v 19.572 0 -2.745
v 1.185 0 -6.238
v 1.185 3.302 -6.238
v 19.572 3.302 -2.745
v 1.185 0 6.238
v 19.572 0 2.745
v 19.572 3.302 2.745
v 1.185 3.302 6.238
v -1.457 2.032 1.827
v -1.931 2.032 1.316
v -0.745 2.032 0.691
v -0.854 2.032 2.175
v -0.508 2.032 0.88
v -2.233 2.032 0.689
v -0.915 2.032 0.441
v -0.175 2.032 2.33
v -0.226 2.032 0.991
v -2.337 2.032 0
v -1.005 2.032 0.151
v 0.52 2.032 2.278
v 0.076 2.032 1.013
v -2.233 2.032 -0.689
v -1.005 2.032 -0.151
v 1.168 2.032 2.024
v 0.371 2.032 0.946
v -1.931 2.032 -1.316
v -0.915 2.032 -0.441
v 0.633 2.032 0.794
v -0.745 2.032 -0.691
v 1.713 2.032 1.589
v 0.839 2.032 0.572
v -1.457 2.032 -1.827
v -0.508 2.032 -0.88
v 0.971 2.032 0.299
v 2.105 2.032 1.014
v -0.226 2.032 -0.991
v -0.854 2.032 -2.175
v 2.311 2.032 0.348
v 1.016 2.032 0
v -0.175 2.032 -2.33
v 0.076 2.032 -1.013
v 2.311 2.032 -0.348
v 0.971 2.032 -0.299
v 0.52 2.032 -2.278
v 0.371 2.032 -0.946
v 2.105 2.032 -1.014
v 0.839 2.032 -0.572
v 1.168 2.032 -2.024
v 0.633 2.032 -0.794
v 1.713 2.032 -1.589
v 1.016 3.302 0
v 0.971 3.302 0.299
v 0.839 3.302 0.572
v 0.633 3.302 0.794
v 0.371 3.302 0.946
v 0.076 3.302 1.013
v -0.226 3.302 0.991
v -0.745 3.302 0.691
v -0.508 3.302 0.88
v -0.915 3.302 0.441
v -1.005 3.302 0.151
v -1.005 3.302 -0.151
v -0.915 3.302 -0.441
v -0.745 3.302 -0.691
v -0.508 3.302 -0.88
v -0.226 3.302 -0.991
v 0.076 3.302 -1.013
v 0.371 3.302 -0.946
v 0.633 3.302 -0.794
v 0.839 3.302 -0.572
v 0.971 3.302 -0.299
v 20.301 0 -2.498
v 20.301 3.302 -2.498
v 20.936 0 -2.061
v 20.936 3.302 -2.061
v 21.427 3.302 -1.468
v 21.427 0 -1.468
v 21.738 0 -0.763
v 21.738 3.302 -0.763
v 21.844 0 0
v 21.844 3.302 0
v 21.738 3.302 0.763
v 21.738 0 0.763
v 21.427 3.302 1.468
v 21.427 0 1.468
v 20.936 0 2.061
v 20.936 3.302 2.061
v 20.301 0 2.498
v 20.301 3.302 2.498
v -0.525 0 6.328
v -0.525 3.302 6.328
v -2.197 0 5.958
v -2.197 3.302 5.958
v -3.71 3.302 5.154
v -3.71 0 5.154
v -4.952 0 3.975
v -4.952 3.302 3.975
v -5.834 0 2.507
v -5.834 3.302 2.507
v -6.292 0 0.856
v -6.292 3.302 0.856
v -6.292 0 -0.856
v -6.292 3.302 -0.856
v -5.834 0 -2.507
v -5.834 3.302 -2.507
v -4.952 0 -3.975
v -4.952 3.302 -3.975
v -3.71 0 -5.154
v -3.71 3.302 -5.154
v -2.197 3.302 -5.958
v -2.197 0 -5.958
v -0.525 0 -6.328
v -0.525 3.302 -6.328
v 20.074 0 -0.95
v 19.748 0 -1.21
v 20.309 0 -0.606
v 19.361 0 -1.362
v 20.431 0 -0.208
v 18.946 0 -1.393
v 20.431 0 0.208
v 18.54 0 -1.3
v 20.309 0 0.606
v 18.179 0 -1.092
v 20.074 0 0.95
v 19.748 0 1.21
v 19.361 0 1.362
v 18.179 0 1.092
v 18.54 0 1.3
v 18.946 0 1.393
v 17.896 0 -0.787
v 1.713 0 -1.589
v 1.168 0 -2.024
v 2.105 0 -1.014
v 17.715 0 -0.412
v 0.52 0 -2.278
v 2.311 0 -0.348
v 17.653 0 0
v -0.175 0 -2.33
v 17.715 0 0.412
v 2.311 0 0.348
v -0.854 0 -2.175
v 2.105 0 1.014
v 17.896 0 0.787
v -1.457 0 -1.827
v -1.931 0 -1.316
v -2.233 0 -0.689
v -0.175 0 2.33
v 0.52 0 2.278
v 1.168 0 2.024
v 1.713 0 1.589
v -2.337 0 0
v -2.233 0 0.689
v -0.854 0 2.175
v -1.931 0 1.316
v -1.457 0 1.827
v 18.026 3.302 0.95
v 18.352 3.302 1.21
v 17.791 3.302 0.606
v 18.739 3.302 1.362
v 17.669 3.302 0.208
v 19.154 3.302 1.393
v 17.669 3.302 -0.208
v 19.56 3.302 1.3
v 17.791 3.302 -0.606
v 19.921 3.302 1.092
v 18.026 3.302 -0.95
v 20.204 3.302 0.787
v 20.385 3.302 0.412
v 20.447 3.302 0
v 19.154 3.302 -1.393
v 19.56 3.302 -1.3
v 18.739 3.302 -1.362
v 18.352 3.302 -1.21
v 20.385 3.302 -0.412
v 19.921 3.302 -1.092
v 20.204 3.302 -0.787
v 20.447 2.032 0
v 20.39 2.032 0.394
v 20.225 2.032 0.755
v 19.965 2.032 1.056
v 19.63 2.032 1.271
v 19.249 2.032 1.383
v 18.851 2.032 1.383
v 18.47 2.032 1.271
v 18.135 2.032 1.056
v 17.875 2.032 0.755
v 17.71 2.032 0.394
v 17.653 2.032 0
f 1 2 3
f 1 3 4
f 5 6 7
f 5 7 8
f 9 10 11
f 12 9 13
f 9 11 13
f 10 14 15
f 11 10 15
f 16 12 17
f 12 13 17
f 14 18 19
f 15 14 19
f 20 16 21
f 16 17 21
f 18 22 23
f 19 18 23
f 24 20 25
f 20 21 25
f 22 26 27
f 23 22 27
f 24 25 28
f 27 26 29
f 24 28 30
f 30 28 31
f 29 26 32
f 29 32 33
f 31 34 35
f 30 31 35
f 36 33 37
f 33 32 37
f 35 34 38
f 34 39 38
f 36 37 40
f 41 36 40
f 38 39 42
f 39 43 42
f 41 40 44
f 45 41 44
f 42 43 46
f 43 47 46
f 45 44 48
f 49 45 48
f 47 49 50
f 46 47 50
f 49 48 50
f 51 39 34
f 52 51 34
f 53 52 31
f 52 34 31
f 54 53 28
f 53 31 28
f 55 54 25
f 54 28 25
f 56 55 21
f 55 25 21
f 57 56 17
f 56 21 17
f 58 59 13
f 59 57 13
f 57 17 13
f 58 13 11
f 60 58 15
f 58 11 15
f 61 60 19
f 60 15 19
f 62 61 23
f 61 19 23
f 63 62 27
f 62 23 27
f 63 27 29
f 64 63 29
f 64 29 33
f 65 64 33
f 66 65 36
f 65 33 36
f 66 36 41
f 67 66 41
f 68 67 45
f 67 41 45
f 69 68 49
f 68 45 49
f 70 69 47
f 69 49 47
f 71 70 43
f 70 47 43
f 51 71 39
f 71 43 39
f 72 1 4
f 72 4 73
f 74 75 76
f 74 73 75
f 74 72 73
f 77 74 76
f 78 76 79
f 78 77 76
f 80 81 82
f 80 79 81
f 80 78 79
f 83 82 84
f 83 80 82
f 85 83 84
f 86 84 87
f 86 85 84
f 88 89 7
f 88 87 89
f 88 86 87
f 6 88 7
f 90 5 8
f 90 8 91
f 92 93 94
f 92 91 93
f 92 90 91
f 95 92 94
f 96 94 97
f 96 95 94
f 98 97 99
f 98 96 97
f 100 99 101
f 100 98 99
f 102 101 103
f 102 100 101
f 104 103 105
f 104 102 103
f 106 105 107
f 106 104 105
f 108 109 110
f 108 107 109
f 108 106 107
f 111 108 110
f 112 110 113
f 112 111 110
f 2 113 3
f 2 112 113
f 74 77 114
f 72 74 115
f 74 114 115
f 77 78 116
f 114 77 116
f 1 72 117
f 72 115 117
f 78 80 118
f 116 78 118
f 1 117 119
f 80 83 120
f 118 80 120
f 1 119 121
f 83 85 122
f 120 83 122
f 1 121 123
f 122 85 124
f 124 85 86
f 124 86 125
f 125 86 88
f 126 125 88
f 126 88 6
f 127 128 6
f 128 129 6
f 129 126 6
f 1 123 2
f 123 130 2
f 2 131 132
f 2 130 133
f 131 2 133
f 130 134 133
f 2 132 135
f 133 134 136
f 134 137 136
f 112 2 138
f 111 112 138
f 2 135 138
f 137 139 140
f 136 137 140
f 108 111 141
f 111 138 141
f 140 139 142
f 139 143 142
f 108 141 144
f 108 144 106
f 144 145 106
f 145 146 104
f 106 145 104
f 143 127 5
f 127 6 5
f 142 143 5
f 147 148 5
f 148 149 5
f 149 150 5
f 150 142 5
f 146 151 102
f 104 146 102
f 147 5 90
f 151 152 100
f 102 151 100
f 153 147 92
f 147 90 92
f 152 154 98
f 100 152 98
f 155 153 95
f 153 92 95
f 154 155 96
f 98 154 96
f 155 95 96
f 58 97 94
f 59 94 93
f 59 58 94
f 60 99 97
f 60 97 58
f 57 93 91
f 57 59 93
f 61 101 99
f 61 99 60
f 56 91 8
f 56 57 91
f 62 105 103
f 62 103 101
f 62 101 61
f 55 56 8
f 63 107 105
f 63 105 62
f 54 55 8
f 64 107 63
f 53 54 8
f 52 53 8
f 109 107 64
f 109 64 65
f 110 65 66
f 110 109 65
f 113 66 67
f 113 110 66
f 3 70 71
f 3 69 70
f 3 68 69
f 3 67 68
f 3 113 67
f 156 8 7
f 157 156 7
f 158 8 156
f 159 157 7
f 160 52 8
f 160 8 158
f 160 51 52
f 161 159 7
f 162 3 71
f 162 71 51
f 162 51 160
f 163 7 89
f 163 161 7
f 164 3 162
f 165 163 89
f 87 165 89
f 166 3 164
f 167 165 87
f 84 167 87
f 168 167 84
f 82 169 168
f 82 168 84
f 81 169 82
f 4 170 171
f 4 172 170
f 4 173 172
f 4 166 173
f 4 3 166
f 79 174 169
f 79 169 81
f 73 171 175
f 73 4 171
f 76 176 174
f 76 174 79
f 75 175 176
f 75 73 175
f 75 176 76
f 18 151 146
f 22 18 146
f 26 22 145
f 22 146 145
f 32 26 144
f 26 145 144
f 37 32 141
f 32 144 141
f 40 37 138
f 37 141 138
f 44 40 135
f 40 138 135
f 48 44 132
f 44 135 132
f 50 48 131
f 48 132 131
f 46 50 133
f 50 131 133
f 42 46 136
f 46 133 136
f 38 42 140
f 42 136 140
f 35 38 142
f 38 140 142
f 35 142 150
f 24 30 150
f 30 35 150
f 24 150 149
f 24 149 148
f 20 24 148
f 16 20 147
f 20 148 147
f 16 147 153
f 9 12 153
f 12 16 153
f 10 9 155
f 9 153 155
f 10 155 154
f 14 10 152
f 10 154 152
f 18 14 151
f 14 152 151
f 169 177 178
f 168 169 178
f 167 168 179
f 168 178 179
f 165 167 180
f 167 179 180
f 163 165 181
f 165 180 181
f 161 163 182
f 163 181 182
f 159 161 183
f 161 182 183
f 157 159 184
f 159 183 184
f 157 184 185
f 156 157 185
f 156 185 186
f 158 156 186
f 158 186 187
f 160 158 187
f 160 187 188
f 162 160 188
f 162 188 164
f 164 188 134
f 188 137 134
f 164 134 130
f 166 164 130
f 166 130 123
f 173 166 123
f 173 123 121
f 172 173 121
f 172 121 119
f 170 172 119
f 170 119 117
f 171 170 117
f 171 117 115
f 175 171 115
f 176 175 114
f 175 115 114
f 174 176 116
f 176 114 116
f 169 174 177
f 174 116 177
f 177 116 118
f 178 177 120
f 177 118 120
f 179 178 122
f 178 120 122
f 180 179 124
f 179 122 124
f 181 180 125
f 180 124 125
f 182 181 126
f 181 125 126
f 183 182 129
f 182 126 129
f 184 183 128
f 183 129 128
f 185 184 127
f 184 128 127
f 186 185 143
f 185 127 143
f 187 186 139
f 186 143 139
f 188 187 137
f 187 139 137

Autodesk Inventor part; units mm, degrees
ref_plane "YZ Plane" through (0, 0, 0) normal (1, 0, 0) x (0, 1, 0)
ref_plane "XZ Plane" through (0, 0, 0) normal (0, 1, 0) x (-1, 0, 0)
ref_plane "XY Plane" through (0, 0, 0) normal (0, 0, 1) x (1, 0, 0)
sketch "Sketch1" plane through (0, 0, 0) normal (0, 1, 0) x (-1, 0, 0)
  circle A0 centre (0, 0) radius 2.3368
  arc A1 (-1.1853, -6.2384) -> (-1.1853, 6.2384) centre (0, 0) ccw
  arc A2 (-19.5715, 2.7449) -> (-19.5715, -2.7449) centre (-19.05, 0) ccw
  line L0 (-1.1853, -6.2384) -> (-19.5715, -2.7449)
  line L1 (-19.5715, 2.7449) -> (-1.1853, 6.2384)
  circle A3 centre (-19.05, 0) radius 1.397
  arc A4 (-2.3333, -0.127) -> (-2.3333, 0.127) centre (-2.3368, 0) ccw
  arc A5 (-2.256, -0.6093) -> (-2.3088, -0.361) centre (-2.2857, -0.4858) ccw
  arc A6 (-2.08, -1.065) -> (-2.1833, -0.8331) centre (-2.1348, -0.9505) ccw
  arc A7 (-1.8131, -1.4742) -> (-1.9623, -1.2688) centre (-1.8905, -1.3735) ccw
  arc A8 (-1.467, -1.819) -> (-1.6557, -1.6491) centre (-1.5636, -1.7366) ccw
  arc A9 (-1.0567, -2.0842) -> (-1.2766, -1.9573) centre (-1.1684, -2.0237) ccw
  arc A10 (-0.6003, -2.2584) -> (-0.8418, -2.1799) centre (-0.7221, -2.2224) ccw
  arc A11 (-0.1176, -2.3338) -> (-0.3702, -2.3073) centre (-0.2443, -2.324) ccw
  arc A12 (0.3702, -2.3073) -> (0.1176, -2.3338) centre (0.2443, -2.324) ccw
  arc A13 (0.8418, -2.1799) -> (0.6003, -2.2584) centre (0.7221, -2.2224) ccw
  arc A14 (1.2766, -1.9573) -> (1.0567, -2.0842) centre (1.1684, -2.0237) ccw
  arc A15 (1.6557, -1.6491) -> (1.467, -1.819) centre (1.5636, -1.7366) ccw
  arc A16 (1.9623, -1.2688) -> (1.8131, -1.4742) centre (1.8905, -1.3735) ccw
  arc A17 (2.1833, -0.8331) -> (2.08, -1.065) centre (2.1348, -0.9505) ccw
  arc A18 (2.3088, -0.361) -> (2.256, -0.6093) centre (2.2857, -0.4858) ccw
  arc A19 (2.3333, 0.127) -> (2.3333, -0.127) centre (2.3368, 0) ccw
  arc A20 (2.256, 0.6093) -> (2.3088, 0.361) centre (2.2857, 0.4858) ccw
  arc A21 (2.08, 1.065) -> (2.1833, 0.8331) centre (2.1348, 0.9505) ccw
  arc A22 (1.8131, 1.4742) -> (1.9623, 1.2688) centre (1.8905, 1.3735) ccw
  arc A23 (1.467, 1.819) -> (1.6557, 1.6491) centre (1.5636, 1.7366) ccw
  arc A24 (1.0567, 2.0842) -> (1.2766, 1.9573) centre (1.1684, 2.0237) ccw
  arc A25 (0.6003, 2.2584) -> (0.8418, 2.1799) centre (0.7221, 2.2224) ccw
  arc A26 (0.1176, 2.3338) -> (0.3702, 2.3073) centre (0.2443, 2.324) ccw
  arc A27 (-0.3702, 2.3073) -> (-0.1176, 2.3338) centre (-0.2443, 2.324) ccw
  arc A28 (-0.8418, 2.1799) -> (-0.6003, 2.2584) centre (-0.7221, 2.2224) ccw
  arc A29 (-1.2766, 1.9573) -> (-1.0567, 2.0842) centre (-1.1684, 2.0237) ccw
  arc A30 (-1.6557, 1.6491) -> (-1.467, 1.819) centre (-1.5636, 1.7366) ccw
  arc A31 (-1.9623, 1.2688) -> (-1.8131, 1.4742) centre (-1.8905, 1.3735) ccw
  arc A32 (-2.1833, 0.8331) -> (-2.08, 1.065) centre (-2.1348, 0.9505) ccw
  arc A33 (-2.3088, 0.361) -> (-2.256, 0.6093) centre (-2.2857, 0.4858) ccw
  point P0 (-2.256, -0.6093)
  point P1 (-2.3088, -0.361)
  point P2 (-2.1833, -0.8331)
  point P3 (-1.8131, -1.4742)
  point P4 (-1.6557, -1.6491)
  point P5 (-1.0567, -2.0842)
  point P6 (-0.8418, -2.1799)
  point P7 (-0.1176, -2.3338)
  point P8 (-0.3702, -2.3073)
  point P9 (0.1176, -2.3338)
  point P10 (0.8418, -2.1799)
  point P11 (0.6003, -2.2584)
  point P12 (1.8131, -1.4742)
  point P13 (2.08, -1.065)
  point P14 (2.3088, -0.361)
  point P15 (2.256, -0.6093)
  point P16 (2.256, 0.6093)
  point P17 (2.3088, 0.361)
  point P18 (2.1833, 0.8331)
  point P19 (1.9623, 1.2688)
  point P20 (1.6557, 1.6491)
  point P21 (1.0567, 2.0842)
  point P22 (1.2766, 1.9573)
  point P23 (0.6003, 2.2584)
  point P24 (0.8418, 2.1799)
  point P25 (0.1176, 2.3338)
  point P26 (0.3702, 2.3073)
  point P27 (-0.1176, 2.3338)
  point P28 (-0.8418, 2.1799)
  point P29 (-0.6003, 2.2584)
  point P30 (-1.2766, 1.9573)
  point P31 (-1.0567, 2.0842)
  point P32 (-1.8131, 1.4742)
  point P33 (-2.08, 1.065)
  point P34 (-2.3088, 0.361)
  point P35 (-2.256, 0.6093)
  dimension "d0" = 4.6736
  dimension "d1" = 12.7
  dimension "d2" = 19.05
  dimension "d3" = 5.588
  dimension "d4" = 2.794
  dimension "d10" = 0.254
  dimension "d13" = 360
extrude "Extrusion1" add sketch "Sketch1" along normal blind 2.032
sketch "Sketch2" plane through (0, 2.032, 0) normal (0, 1, 0) x (1, 0, 0)
  line L0 (19.5715, 2.7449) -> (1.1853, 6.2384) projected
  arc A0 (1.1853, 6.2384) -> (1.1853, -6.2384) centre (0, 0) ccw projected
  line L1 (1.1853, -6.2384) -> (19.5715, -2.7449) projected
  arc A1 (19.5715, -2.7449) -> (19.5715, 2.7449) centre (19.05, 0) ccw projected
  circle A2 centre (0, 0) radius 2.3368 projected
  circle A3 centre (19.05, 0) radius 1.397 projected
  circle A4 centre (0, 0) radius 1.016
  dimension "d7" = 2.032
extrude "Extrusion2" add sketch "Sketch2" along normal blind 1.27 contours A1 L1 A0 L0 | A2
properties part number "Servo Spinner"
